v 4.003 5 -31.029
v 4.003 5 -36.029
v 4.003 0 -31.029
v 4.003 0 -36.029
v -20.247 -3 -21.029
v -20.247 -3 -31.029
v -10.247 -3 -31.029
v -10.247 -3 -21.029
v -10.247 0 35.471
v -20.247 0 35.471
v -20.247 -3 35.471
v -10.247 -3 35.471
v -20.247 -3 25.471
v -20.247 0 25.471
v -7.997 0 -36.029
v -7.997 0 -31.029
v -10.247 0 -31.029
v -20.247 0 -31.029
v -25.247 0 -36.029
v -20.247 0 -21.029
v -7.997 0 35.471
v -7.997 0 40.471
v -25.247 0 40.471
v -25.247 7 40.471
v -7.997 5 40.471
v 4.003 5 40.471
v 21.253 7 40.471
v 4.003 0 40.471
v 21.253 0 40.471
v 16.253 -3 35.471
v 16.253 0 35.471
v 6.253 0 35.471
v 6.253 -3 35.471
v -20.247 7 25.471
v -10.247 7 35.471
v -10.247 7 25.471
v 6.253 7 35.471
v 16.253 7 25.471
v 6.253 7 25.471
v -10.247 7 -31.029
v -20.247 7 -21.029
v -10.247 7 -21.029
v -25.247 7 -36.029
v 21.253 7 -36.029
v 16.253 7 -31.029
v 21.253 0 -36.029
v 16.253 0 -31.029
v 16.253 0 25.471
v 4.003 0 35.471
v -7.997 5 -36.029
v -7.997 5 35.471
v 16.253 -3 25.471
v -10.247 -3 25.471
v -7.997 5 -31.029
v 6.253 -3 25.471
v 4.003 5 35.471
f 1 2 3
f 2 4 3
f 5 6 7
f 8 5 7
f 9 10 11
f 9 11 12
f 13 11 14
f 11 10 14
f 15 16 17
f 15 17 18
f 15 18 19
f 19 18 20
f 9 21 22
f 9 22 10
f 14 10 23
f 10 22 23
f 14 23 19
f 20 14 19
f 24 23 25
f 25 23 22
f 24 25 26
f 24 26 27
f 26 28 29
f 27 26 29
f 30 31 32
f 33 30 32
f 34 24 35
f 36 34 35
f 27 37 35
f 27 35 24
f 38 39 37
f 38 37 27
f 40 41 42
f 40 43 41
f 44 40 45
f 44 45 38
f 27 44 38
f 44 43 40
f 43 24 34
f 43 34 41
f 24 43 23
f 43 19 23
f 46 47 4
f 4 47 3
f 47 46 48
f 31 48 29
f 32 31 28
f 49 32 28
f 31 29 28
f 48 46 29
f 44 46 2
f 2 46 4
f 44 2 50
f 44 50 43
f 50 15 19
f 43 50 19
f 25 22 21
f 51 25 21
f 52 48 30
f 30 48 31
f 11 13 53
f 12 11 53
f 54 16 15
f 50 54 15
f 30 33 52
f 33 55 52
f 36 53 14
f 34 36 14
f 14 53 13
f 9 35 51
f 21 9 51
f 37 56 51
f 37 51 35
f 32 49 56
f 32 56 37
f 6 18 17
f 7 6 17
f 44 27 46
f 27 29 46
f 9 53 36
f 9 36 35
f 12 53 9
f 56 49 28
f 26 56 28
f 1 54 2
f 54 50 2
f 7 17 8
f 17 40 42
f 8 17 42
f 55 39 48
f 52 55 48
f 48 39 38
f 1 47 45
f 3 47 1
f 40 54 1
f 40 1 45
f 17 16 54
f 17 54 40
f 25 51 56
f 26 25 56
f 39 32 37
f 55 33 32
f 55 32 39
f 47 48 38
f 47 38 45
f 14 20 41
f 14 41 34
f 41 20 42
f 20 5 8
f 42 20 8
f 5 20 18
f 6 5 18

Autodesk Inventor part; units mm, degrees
ref_plane "YZ Plane" through (0, 0, 0) normal (1, 0, 0) x (0, 1, 0)
ref_plane "XZ Plane" through (0, 0, 0) normal (0, 1, 0) x (-1, 0, 0)
ref_plane "XY Plane" through (0, 0, 0) normal (0, 0, 1) x (1, 0, 0)
sketch "Sketch1" plane through (0, 0, 0) normal (0, 1, 0) x (-1, 0, 0)
  line L0 (25.2467, -36.0292) -> (-21.2533, -36.0292)
  line L1 (-4.0033, -36.0292) -> (-4.0033, -31.0292)
  line L2 (-21.2533, -36.0292) -> (-4.0033, -36.0292)
  line L3 (-4.0033, -36.0292) -> (-4.0033, -31.0292)
  line L4 (-4.0033, -31.0292) -> (-16.2533, -31.0292)
  line L5 (-4.0033, -31.0292) -> (-16.2533, -31.0292)
  line L6 (-16.2533, -31.0292) -> (-16.2533, 35.4708)
  line L7 (-16.2533, -31.0292) -> (-16.2533, 35.4708)
  line L8 (-16.2533, 35.4708) -> (-4.0033, 35.4708)
  line L9 (-4.0033, 35.4708) -> (-4.0033, 40.4708)
  line L10 (-21.2533, 40.4708) -> (25.2467, 40.4708)
  line L11 (-21.2533, -36.0292) -> (-21.2533, 40.4708)
  line L12 (-21.2533, 40.4708) -> (-4.0033, 40.4708)
  line L13 (-21.2533, 40.4708) -> (-21.2533, -36.0292)
  line L14 (7.9967, -31.0292) -> (7.9967, -36.0292)
  line L15 (7.9967, -36.0292) -> (25.2467, -36.0292)
  line L16 (25.2467, -36.0292) -> (25.2467, 40.4708)
  line L17 (25.2467, -36.0292) -> (25.2467, 40.4708)
  line L18 (25.2467, 40.4708) -> (7.9967, 40.4708)
  line L19 (7.9967, 40.4708) -> (7.9967, 35.4708)
  line L20 (7.9967, 35.4708) -> (7.9967, 40.4708)
  line L21 (20.2467, -31.0292) -> (7.9967, -31.0292)
  line L22 (7.9967, -36.0292) -> (7.9967, -31.0292)
  line L23 (7.9967, -31.0292) -> (20.2467, -31.0292)
  line L24 (20.2467, 35.4708) -> (20.2467, -31.0292)
  line L25 (20.2467, -31.0292) -> (20.2467, 35.4708)
  line L26 (7.9967, 35.4708) -> (20.2467, 35.4708)
  line L27 (20.2467, 35.4708) -> (7.9967, 35.4708)
  point P0 (0, 0)
extrude "Extrusion1" add sketch "Sketch1" along normal blind 5 contours L0 L14 L21 L24 L26 L19 L10 L16 | L0 L11 L10 L9 L8 L6 L4 L1
sketch "Sketch2" plane through (0, 5, 0) normal (0, 1, 0) x (1, 0, 0)
  point P0 (0, 0)
sketch "Sketch3" plane through (0, 5, 0) normal (0, 1, 0) x (1, 0, 0)
  line L0 (-20.2467, -35.4708) -> (-20.2467, 31.0292) projected
  line L1 (-20.2467, -35.4708) -> (-10.2467, -35.4708)
  line L2 (-10.2467, -35.4708) -> (-10.2467, -25.4708)
  line L3 (-10.2467, -25.4708) -> (-20.2467, -25.4708)
  line L4 (-20.2467, -25.4708) -> (-20.2467, -35.4708)
  line L5 (16.2533, 31.0292) -> (16.2533, -35.4708) projected
  line L6 (16.2533, -35.4708) -> (6.2533, -35.4708)
  line L7 (6.2533, -35.4708) -> (6.2533, -25.4708)
  line L8 (6.2533, -25.4708) -> (16.2533, -25.4708)
  line L9 (16.2533, -25.4708) -> (16.2533, -35.4708)
  line L10 (-20.2467, 31.0292) -> (-10.2467, 31.0292)
  line L11 (-10.2467, 31.0292) -> (-10.2467, 21.0292)
  line L12 (-10.2467, 21.0292) -> (-20.2467, 21.0292)
  line L13 (-20.2467, 21.0292) -> (-20.2467, 31.0292)
  point P0 (0, 0)
  dimension "d2" = 10
  dimension "d3" = 10
  dimension "d4" = 10
  dimension "d5" = 10
  dimension "d6" = 10
  dimension "d7" = 10
extrude "Extrusion2" add sketch "Sketch3" against normal blind 8
sketch "Sketch4" plane through (0, 5, 0) normal (0, 1, 0) x (1, 0, 0)
  line L0 (-25.2467, 36.0292) -> (-25.2467, -40.4708) projected
  line L1 (21.2533, -40.4708) -> (21.2533, 36.0292) projected
  line L2 (-25.2467, -40.4708) -> (21.2533, -40.4708)
  line L3 (21.2533, -40.4708) -> (21.2533, 36.0292)
  line L4 (21.2533, 36.0292) -> (-25.2467, 36.0292)
  line L5 (-25.2467, 36.0292) -> (-25.2467, -40.4708)
  line L6 (16.2533, 31.0292) -> (16.2533, -25.4708) projected
  line L7 (-20.2467, -35.4708) -> (-20.2467, -25.4708) projected
  line L8 (16.2533, 31.0292) -> (-20.2467, 31.0292)
  line L9 (-20.2467, 31.0292) -> (-20.2467, -35.4708)
  line L10 (-20.2467, -35.4708) -> (16.2533, -35.4708)
  line L11 (16.2533, -35.4708) -> (16.2533, 31.0292)
  point P0 (0, 0)
extrude "Extrusion3" add sketch "Sketch4" along normal blind 2
sketch "Sketch5" plane through (0, 5, 0) normal (0, 1, 0) x (1, 0, 0)
  line L0 (-10.2467, -25.4708) -> (-10.2467, -35.4708) projected
  line L1 (-20.2467, -35.4708) -> (-20.2467, -25.4708) projected
  line L2 (-10.2467, -25.4708) -> (-20.2467, -25.4708)
  line L3 (-20.2467, -25.4708) -> (-20.2467, -35.4708)
  line L4 (-20.2467, -35.4708) -> (-10.2467, -35.4708)
  line L5 (-10.2467, -35.4708) -> (-10.2467, -25.4708)
  line L6 (-20.2467, 21.0292) -> (-10.2467, 21.0292) projected
  line L7 (-20.2467, 31.0292) -> (16.2533, 31.0292) projected
  line L8 (-10.2467, 21.0292) -> (-20.2467, 21.0292)
  line L9 (-20.2467, 21.0292) -> (-20.2467, 31.0292)
  line L10 (-20.2467, 31.0292) -> (-10.2467, 31.0292)
  line L11 (-10.2467, 31.0292) -> (-10.2467, 21.0292)
  line L12 (16.2533, -25.4708) -> (6.2533, -25.4708) projected
  line L13 (16.2533, -25.4708) -> (16.2533, -35.4708) projected
  line L14 (6.2533, -25.4708) -> (16.2533, -25.4708)
  line L15 (16.2533, -25.4708) -> (16.2533, -35.4708)
  line L16 (16.2533, -35.4708) -> (6.2533, -35.4708)
  line L17 (6.2533, -35.4708) -> (6.2533, -25.4708)
  point P0 (0, 0)
extrude "Extrusion4" add sketch "Sketch5" along normal blind 2
properties part number "voltage buckboost cover top"
